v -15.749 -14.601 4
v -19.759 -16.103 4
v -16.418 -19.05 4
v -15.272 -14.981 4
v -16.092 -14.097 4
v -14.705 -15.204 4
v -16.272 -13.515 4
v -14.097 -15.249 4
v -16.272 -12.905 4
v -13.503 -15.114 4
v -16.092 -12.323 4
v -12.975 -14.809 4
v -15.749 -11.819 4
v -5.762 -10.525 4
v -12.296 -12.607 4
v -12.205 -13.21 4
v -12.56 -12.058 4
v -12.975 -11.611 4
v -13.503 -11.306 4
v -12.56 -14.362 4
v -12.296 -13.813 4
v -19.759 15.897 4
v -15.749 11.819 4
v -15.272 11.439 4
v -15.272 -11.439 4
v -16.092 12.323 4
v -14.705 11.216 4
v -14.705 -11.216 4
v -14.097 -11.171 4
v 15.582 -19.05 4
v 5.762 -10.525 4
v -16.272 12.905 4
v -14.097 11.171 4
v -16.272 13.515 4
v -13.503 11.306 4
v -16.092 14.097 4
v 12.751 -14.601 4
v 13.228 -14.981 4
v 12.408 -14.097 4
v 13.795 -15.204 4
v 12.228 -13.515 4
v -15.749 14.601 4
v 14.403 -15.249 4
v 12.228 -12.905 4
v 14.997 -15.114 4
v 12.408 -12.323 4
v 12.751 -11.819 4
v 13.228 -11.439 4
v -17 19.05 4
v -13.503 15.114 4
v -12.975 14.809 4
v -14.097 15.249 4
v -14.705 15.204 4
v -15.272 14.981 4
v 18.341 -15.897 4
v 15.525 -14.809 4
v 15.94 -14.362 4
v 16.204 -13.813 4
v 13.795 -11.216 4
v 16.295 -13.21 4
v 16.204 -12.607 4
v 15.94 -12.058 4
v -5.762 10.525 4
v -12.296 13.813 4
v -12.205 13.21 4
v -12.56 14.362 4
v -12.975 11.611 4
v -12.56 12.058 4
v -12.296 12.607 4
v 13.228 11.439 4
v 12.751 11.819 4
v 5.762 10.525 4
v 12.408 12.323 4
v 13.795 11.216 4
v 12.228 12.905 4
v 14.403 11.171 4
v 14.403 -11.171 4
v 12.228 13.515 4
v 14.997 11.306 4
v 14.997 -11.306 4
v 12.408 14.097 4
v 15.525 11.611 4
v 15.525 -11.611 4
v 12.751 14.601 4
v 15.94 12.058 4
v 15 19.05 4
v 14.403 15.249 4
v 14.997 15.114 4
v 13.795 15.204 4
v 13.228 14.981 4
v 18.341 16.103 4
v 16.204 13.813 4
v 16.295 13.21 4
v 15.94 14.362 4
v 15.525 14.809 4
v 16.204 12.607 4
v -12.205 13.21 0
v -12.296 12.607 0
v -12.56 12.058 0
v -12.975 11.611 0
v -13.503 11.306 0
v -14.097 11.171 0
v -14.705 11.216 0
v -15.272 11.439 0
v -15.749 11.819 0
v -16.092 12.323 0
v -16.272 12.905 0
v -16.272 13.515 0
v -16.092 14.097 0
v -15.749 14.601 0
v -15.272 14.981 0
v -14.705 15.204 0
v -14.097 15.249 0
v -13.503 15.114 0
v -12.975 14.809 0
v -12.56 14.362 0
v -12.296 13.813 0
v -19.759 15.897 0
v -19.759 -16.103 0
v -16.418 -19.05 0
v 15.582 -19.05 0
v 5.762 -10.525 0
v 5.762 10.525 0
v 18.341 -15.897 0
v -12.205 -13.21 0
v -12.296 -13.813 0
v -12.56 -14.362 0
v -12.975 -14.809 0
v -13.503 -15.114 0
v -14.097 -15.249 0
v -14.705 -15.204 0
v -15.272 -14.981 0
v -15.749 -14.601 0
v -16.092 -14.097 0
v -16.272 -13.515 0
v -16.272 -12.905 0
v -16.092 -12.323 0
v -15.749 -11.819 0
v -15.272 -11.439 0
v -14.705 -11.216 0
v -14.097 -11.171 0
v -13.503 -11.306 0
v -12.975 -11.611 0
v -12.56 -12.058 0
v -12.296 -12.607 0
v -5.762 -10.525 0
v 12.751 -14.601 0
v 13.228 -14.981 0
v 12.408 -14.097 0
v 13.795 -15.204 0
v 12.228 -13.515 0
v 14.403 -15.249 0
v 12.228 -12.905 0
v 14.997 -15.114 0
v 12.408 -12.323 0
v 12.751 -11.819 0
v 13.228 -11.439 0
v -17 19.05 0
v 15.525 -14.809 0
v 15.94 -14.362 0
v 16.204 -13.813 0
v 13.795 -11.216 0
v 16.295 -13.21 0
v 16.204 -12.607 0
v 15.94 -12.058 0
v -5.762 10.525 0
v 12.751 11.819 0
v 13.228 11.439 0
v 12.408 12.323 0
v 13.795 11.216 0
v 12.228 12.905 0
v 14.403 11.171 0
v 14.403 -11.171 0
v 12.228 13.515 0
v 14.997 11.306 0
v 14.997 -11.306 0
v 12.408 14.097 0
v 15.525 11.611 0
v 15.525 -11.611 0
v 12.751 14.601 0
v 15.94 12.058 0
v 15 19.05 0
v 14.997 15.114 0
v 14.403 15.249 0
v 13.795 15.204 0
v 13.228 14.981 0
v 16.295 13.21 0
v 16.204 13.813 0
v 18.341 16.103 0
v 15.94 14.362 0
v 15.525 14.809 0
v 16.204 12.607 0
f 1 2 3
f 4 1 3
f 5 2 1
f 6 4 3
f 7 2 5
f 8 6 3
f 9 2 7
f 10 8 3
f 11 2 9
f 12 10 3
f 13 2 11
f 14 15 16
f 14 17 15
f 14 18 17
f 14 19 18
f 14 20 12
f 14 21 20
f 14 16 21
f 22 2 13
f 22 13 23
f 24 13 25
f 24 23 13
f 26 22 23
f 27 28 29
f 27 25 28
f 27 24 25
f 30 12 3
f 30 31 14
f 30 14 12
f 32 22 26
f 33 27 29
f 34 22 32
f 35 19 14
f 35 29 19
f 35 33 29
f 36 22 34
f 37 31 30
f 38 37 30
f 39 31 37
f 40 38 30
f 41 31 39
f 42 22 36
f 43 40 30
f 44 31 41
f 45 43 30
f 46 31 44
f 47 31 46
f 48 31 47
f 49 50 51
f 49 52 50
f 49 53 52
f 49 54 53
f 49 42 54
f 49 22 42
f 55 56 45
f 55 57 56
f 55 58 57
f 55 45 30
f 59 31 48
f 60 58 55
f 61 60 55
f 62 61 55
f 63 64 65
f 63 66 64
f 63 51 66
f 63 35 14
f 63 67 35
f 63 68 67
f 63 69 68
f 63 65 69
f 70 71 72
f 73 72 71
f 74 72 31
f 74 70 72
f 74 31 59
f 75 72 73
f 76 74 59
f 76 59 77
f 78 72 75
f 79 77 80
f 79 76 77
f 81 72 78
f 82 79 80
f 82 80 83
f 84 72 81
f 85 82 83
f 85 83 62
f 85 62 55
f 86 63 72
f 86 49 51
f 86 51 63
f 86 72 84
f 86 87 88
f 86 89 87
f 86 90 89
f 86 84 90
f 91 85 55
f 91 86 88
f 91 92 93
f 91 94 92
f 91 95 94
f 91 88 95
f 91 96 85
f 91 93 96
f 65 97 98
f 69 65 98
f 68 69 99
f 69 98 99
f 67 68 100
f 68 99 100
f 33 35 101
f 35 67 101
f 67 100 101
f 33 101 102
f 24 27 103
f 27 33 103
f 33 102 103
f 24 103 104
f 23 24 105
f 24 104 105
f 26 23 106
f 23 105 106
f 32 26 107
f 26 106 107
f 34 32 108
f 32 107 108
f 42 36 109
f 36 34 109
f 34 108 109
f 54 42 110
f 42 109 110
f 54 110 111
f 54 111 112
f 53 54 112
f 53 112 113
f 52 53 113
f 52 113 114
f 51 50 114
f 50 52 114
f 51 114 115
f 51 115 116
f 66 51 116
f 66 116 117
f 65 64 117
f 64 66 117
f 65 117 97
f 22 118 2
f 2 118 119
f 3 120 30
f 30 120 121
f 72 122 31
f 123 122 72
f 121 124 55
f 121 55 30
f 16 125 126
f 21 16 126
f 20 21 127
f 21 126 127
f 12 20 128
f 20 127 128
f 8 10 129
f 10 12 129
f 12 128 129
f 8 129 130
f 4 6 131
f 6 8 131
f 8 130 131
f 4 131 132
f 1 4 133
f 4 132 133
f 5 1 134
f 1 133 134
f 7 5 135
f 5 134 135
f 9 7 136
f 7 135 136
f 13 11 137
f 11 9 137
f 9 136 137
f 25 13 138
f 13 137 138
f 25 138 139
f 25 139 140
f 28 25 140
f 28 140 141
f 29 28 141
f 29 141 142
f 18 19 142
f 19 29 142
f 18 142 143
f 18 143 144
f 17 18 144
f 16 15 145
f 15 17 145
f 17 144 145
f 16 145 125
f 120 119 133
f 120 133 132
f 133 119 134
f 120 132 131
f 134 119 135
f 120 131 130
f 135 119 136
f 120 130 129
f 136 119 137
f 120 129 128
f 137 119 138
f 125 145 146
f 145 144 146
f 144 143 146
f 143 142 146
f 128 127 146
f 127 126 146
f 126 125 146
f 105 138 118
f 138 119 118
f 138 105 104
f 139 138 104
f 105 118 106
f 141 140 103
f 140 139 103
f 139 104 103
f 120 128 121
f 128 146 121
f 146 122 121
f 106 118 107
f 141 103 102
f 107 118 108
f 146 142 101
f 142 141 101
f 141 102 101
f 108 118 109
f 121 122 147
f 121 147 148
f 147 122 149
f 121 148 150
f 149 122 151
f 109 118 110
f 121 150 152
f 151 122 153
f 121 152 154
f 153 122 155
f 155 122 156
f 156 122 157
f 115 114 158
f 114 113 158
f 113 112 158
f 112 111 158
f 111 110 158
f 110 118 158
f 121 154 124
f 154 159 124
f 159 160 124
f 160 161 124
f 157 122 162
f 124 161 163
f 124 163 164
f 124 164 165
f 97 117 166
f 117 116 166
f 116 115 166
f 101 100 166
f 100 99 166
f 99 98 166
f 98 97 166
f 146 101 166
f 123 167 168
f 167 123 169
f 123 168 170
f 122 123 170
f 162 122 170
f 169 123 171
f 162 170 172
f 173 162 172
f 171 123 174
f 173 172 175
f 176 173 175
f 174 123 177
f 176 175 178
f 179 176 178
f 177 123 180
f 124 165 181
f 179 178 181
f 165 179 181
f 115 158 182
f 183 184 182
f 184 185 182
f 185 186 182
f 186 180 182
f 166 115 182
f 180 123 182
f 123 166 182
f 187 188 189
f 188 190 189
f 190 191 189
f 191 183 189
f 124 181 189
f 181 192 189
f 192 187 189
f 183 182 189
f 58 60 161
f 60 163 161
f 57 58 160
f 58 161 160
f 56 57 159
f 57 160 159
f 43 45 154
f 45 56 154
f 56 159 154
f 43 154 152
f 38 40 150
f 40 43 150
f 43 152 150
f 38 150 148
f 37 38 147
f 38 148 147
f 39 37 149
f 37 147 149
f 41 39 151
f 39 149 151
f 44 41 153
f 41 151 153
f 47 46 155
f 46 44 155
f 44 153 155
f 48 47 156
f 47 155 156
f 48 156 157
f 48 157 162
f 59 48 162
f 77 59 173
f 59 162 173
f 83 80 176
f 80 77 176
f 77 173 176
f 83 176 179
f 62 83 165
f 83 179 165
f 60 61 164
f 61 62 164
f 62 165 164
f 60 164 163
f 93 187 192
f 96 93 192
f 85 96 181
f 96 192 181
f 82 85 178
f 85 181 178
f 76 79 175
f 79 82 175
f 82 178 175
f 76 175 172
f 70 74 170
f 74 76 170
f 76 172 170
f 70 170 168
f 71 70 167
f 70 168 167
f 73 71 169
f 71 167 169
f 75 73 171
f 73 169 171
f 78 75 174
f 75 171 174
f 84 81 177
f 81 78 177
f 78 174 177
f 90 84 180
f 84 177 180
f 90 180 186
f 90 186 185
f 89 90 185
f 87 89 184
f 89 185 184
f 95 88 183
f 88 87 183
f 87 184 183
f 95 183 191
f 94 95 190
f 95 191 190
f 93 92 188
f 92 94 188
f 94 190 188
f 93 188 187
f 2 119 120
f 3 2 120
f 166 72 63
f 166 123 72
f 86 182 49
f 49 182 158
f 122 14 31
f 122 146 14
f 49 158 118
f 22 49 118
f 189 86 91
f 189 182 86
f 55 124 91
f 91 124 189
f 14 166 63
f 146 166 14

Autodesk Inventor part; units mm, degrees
ref_plane "YZ Plane" through (0, 0, 0) normal (1, 0, 0) x (0, 1, 0)
ref_plane "XZ Plane" through (0, 0, 0) normal (0, 1, 0) x (-1, 0, 0)
ref_plane "XY Plane" through (0, 0, 0) normal (0, 0, 1) x (1, 0, 0)
sketch "Sketch3" plane through (0, 0, 0) normal (0, 0, 1) x (1, 0, 0)
  line L0 (-16.4175, -19.05) -> (15.5825, -19.05)
  line L1 (18.3411, -15.8973) -> (18.3411, 16.1027)
  line L2 (14.9996, 19.05) -> (-17.0004, 19.05)
  line L3 (-19.7589, 15.8973) -> (-19.7589, -16.1027)
  line L4 (-17.0004, 19.05) -> (-19.7589, 15.8973)
  line L5 (14.9996, 19.05) -> (18.3411, 16.1027)
  line L6 (18.3411, -15.8973) -> (15.5825, -19.05)
  line L7 (-19.7589, -16.1027) -> (-16.4175, -19.05)
  line L8 (-5.7625, -10.525) -> (5.7625, -10.525)
  line L9 (5.7625, -10.525) -> (5.7625, 10.525)
  line L10 (5.7625, 10.525) -> (-5.7625, 10.525)
  line L11 (-5.7625, 10.525) -> (-5.7625, -10.525)
  circle A0 centre (-14.25, 13.21) radius 2.045
  circle A1 centre (14.25, 13.21) radius 2.045
  circle A2 centre (-14.25, -13.21) radius 2.045
  circle A3 centre (14.25, -13.21) radius 2.045
  point P0 (0, 0)
  dimension "d10" = 11.525
  dimension "d11" = 21.05
  dimension "d12" = 4.09
  dimension "d13" = 4.09
  dimension "d17" = 4.09
  dimension "d19" = 28.5
  dimension "d21" = 4.09
  dimension "d38" = 10.525
  dimension "d39" = 5.7625
  dimension "d45" = 38.1
  dimension "d46" = 38.1
  dimension "d47" = 32
  dimension "d48" = 32
  dimension "d49" = 32
  dimension "d50" = 32
  dimension "d63" = 28.5
  dimension "d67" = 19.05
  dimension "d68" = 14.25
  dimension "d69" = 14.25
  dimension "d70" = 26.42
  dimension "d72" = 13.21
  dimension "d73" = 26.42
  dimension "d75" = 13.21
extrude "Extrusion5" add sketch "Sketch3" along normal blind 4
properties part number "WG17FLANGE"
